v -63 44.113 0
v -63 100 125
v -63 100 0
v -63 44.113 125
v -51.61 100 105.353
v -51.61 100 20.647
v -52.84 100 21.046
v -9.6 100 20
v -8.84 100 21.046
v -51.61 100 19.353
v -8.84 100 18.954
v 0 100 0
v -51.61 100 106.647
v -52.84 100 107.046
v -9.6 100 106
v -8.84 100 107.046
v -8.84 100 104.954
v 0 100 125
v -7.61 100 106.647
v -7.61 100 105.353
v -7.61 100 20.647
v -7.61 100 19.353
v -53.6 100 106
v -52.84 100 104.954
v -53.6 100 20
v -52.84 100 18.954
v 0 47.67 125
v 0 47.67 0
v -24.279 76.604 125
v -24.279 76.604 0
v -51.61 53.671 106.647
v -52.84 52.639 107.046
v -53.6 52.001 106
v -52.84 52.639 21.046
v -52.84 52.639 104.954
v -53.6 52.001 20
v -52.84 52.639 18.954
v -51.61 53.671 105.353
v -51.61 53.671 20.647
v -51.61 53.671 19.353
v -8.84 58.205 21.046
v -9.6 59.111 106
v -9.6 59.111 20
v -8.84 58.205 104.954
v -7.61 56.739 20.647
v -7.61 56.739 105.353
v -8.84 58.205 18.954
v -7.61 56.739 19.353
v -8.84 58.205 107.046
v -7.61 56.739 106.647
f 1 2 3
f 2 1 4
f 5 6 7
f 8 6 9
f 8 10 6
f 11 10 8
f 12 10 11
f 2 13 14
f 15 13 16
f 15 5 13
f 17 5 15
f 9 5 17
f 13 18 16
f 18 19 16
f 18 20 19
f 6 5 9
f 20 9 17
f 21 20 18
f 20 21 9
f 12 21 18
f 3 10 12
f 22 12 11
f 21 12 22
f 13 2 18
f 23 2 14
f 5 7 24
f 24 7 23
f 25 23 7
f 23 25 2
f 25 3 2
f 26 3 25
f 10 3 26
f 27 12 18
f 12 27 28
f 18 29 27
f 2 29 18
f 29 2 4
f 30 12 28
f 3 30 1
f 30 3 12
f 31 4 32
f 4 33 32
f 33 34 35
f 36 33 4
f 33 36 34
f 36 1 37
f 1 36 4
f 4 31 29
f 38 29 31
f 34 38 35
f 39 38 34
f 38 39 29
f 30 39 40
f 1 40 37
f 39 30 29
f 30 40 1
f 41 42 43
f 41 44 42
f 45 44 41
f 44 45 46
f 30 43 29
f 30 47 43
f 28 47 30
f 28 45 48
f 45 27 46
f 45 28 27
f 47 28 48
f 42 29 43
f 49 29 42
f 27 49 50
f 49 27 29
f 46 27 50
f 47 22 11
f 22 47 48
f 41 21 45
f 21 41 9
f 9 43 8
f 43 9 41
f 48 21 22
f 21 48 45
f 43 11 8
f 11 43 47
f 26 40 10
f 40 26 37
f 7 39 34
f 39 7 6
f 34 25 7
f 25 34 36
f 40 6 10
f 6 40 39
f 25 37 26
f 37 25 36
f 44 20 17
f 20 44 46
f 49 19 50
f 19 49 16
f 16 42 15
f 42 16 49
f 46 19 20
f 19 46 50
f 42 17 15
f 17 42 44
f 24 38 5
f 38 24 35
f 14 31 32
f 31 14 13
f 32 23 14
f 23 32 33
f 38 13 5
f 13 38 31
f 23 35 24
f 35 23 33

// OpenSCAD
// Размеры звонка Ring Video Doorbell Gen 2
ring_height = 125;
ring_width = 63;
ring_thickness = 100;

hole_radius = 1.1;
hole_distance_x = 44;
hole_distance_y = 86;
hole_offset_x = 8.5;
hole_offset_y = 20;

rotate_angle = 40;

rotate([90, 0, 180])
difference ()
{
    cube([ring_width, ring_height, ring_thickness]);

    // Make a cut
    translate([-40, -40, 0])    
    rotate([0, rotate_angle, 0])
    cube([120, 200, 100]);
    
    // Make holes for original mount
    translate([hole_offset_x, hole_offset_y, 0]) 
    cylinder(h = 120, r = hole_radius);
    
    translate([hole_offset_x + hole_distance_x, hole_offset_y, 0]) 
    cylinder(h = 120, r = hole_radius);

    translate([hole_offset_x, hole_offset_y + hole_distance_y, 0]) 
    cylinder(h = 120, r = hole_radius);

    translate([hole_offset_x + hole_distance_x, hole_offset_y + hole_distance_y, 0]) 
    cylinder(h = 120, r = hole_radius);
}
